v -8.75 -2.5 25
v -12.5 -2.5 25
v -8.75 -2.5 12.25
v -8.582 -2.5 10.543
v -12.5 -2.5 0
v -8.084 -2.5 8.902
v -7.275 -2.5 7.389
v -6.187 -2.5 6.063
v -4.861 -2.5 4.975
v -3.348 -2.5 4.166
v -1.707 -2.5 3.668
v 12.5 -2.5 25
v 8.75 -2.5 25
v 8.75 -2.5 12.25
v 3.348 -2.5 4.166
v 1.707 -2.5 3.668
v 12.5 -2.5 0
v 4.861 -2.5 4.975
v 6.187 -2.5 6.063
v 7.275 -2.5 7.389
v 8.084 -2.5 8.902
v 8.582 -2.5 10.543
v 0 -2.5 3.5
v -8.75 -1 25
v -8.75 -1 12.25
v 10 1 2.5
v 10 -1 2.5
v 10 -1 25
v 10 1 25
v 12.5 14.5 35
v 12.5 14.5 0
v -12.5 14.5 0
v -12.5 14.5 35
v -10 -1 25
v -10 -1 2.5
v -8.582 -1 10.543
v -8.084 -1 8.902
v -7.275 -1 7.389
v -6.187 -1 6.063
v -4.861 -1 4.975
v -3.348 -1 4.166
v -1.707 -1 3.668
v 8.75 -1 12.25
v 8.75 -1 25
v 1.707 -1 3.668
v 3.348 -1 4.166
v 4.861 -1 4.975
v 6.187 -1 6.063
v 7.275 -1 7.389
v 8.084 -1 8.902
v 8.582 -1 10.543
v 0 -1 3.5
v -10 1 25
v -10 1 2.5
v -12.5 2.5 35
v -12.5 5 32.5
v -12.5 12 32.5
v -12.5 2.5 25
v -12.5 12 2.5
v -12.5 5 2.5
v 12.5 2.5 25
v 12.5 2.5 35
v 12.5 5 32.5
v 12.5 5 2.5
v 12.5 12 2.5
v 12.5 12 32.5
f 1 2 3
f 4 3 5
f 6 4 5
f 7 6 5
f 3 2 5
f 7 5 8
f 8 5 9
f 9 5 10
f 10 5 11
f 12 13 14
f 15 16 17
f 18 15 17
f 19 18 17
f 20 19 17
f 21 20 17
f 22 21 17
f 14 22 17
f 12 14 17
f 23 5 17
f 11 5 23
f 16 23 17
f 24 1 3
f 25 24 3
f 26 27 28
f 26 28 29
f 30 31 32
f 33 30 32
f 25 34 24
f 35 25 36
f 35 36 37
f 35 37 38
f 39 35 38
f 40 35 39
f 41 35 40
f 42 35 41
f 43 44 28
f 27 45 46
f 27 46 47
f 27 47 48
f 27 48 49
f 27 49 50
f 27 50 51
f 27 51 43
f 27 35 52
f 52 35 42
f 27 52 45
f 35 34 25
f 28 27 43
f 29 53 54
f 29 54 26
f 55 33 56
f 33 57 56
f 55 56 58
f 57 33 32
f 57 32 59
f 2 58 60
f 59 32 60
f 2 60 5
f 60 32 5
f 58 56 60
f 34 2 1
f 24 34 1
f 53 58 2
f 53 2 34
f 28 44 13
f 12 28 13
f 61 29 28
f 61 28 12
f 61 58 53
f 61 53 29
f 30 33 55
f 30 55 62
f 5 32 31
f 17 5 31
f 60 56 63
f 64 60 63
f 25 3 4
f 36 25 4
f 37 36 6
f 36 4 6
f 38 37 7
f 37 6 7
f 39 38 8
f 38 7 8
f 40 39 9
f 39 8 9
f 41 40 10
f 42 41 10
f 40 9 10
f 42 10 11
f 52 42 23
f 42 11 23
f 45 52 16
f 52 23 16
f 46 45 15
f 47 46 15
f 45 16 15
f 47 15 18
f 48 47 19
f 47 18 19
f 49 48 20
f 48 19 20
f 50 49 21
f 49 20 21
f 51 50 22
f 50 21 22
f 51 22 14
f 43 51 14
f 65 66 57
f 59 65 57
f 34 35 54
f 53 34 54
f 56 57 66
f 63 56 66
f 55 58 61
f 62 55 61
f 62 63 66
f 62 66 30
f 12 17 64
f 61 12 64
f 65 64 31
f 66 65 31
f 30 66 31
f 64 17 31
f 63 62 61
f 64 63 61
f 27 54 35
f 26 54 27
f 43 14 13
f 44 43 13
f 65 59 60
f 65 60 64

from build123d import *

# Parameters (mm, degrees)
F0_W     = 20
F0_H     = 2
F1_DEPTH = 2.5
F0_W_2   = 25
F0_H_2   = 5
F2_DEPTH = 25
F4_DEPTH = 2.5
F0_W_3   = 2.5
F0_H_3   = 7
F5_DEPTH = 35
F6_DEPTH = 32.5
F7_DEPTH = 2.5


with BuildPart() as f1:
    # F0 (on Top) → F1 (new body)
    with BuildSketch(Plane.XY):
        Rectangle(F0_W, F0_H)
    extrude(amount=F1_DEPTH)

    # F0 (on Top) → F2 (join)
    with BuildSketch(Plane.XY):
        Rectangle(F0_W_2, F0_H_2)
        Rectangle(F0_W, F0_H, mode=Mode.SUBTRACT)
    extrude(amount=F2_DEPTH)

    # F3 (on face) → F4 (cut)
    with BuildSketch(Plane.XZ.offset(2.5)):
        with BuildLine():
            ThreePointArc((-8.75, 12.25), (0, 3.5), (8.75, 12.25))
            ThreePointArc((8.75, 12.25), (0, 21), (-8.75, 12.25))
        make_face()
        with BuildLine():
            ThreePointArc((-8.75, 12.25), (0, 21), (8.75, 12.25))
            Line((8.75, 12.25), (8.75, 25))
            Line((8.75, 25), (-8.75, 25))
            Line((-8.75, 25), (-8.75, 12.25))
        make_face()
    extrude(amount=-F4_DEPTH, mode=Mode.SUBTRACT)

    # F0 (on Top) → F5 (join)
    with BuildSketch(Plane.XY):
        Polygon((10, 12), (12.5, 12), (12.5, 14.5), (-12.5, 14.5), (-12.5, 12), (-10, 12), align=None)
        with Locations((-11.25, 8.5)):
            Rectangle(F0_W_3, F0_H_3)
        with Locations((0, 8.5)):
            Rectangle(F0_W, F0_H_3)
        Polygon((-12.5, 2.5), (12.5, 2.5), (12.5, 5), (10, 5), (-10, 5), (-12.5, 5), align=None)
        with Locations((11.25, 8.5)):
            Rectangle(F0_W_3, F0_H_3)
    extrude(amount=F5_DEPTH)

    # F0 (on Top) → F6 (cut)
    with BuildSketch(Plane.XY):
        with Locations((11.25, 8.5)):
            Rectangle(F0_W_3, F0_H_3)
        with Locations((0, 8.5)):
            Rectangle(F0_W, F0_H_3)
        with Locations((-11.25, 8.5)):
            Rectangle(F0_W_3, F0_H_3)
    extrude(amount=F6_DEPTH, mode=Mode.SUBTRACT)

    # F0 (on Top) → F7 (join)
    with BuildSketch(Plane.XY):
        with Locations((11.25, 8.5)):
            Rectangle(F0_W_3, F0_H_3)
        with Locations((0, 8.5)):
            Rectangle(F0_W, F0_H_3)
        with Locations((-11.25, 8.5)):
            Rectangle(F0_W_3, F0_H_3)
        Polygon((10, 12), (12.5, 12), (12.5, 14.5), (-12.5, 14.5), (-12.5, 12), (-10, 12), align=None)
        Polygon((-12.5, 2.5), (12.5, 2.5), (12.5, 5), (10, 5), (-10, 5), (-12.5, 5), align=None)
    extrude(amount=F7_DEPTH)


solid = f1.part
